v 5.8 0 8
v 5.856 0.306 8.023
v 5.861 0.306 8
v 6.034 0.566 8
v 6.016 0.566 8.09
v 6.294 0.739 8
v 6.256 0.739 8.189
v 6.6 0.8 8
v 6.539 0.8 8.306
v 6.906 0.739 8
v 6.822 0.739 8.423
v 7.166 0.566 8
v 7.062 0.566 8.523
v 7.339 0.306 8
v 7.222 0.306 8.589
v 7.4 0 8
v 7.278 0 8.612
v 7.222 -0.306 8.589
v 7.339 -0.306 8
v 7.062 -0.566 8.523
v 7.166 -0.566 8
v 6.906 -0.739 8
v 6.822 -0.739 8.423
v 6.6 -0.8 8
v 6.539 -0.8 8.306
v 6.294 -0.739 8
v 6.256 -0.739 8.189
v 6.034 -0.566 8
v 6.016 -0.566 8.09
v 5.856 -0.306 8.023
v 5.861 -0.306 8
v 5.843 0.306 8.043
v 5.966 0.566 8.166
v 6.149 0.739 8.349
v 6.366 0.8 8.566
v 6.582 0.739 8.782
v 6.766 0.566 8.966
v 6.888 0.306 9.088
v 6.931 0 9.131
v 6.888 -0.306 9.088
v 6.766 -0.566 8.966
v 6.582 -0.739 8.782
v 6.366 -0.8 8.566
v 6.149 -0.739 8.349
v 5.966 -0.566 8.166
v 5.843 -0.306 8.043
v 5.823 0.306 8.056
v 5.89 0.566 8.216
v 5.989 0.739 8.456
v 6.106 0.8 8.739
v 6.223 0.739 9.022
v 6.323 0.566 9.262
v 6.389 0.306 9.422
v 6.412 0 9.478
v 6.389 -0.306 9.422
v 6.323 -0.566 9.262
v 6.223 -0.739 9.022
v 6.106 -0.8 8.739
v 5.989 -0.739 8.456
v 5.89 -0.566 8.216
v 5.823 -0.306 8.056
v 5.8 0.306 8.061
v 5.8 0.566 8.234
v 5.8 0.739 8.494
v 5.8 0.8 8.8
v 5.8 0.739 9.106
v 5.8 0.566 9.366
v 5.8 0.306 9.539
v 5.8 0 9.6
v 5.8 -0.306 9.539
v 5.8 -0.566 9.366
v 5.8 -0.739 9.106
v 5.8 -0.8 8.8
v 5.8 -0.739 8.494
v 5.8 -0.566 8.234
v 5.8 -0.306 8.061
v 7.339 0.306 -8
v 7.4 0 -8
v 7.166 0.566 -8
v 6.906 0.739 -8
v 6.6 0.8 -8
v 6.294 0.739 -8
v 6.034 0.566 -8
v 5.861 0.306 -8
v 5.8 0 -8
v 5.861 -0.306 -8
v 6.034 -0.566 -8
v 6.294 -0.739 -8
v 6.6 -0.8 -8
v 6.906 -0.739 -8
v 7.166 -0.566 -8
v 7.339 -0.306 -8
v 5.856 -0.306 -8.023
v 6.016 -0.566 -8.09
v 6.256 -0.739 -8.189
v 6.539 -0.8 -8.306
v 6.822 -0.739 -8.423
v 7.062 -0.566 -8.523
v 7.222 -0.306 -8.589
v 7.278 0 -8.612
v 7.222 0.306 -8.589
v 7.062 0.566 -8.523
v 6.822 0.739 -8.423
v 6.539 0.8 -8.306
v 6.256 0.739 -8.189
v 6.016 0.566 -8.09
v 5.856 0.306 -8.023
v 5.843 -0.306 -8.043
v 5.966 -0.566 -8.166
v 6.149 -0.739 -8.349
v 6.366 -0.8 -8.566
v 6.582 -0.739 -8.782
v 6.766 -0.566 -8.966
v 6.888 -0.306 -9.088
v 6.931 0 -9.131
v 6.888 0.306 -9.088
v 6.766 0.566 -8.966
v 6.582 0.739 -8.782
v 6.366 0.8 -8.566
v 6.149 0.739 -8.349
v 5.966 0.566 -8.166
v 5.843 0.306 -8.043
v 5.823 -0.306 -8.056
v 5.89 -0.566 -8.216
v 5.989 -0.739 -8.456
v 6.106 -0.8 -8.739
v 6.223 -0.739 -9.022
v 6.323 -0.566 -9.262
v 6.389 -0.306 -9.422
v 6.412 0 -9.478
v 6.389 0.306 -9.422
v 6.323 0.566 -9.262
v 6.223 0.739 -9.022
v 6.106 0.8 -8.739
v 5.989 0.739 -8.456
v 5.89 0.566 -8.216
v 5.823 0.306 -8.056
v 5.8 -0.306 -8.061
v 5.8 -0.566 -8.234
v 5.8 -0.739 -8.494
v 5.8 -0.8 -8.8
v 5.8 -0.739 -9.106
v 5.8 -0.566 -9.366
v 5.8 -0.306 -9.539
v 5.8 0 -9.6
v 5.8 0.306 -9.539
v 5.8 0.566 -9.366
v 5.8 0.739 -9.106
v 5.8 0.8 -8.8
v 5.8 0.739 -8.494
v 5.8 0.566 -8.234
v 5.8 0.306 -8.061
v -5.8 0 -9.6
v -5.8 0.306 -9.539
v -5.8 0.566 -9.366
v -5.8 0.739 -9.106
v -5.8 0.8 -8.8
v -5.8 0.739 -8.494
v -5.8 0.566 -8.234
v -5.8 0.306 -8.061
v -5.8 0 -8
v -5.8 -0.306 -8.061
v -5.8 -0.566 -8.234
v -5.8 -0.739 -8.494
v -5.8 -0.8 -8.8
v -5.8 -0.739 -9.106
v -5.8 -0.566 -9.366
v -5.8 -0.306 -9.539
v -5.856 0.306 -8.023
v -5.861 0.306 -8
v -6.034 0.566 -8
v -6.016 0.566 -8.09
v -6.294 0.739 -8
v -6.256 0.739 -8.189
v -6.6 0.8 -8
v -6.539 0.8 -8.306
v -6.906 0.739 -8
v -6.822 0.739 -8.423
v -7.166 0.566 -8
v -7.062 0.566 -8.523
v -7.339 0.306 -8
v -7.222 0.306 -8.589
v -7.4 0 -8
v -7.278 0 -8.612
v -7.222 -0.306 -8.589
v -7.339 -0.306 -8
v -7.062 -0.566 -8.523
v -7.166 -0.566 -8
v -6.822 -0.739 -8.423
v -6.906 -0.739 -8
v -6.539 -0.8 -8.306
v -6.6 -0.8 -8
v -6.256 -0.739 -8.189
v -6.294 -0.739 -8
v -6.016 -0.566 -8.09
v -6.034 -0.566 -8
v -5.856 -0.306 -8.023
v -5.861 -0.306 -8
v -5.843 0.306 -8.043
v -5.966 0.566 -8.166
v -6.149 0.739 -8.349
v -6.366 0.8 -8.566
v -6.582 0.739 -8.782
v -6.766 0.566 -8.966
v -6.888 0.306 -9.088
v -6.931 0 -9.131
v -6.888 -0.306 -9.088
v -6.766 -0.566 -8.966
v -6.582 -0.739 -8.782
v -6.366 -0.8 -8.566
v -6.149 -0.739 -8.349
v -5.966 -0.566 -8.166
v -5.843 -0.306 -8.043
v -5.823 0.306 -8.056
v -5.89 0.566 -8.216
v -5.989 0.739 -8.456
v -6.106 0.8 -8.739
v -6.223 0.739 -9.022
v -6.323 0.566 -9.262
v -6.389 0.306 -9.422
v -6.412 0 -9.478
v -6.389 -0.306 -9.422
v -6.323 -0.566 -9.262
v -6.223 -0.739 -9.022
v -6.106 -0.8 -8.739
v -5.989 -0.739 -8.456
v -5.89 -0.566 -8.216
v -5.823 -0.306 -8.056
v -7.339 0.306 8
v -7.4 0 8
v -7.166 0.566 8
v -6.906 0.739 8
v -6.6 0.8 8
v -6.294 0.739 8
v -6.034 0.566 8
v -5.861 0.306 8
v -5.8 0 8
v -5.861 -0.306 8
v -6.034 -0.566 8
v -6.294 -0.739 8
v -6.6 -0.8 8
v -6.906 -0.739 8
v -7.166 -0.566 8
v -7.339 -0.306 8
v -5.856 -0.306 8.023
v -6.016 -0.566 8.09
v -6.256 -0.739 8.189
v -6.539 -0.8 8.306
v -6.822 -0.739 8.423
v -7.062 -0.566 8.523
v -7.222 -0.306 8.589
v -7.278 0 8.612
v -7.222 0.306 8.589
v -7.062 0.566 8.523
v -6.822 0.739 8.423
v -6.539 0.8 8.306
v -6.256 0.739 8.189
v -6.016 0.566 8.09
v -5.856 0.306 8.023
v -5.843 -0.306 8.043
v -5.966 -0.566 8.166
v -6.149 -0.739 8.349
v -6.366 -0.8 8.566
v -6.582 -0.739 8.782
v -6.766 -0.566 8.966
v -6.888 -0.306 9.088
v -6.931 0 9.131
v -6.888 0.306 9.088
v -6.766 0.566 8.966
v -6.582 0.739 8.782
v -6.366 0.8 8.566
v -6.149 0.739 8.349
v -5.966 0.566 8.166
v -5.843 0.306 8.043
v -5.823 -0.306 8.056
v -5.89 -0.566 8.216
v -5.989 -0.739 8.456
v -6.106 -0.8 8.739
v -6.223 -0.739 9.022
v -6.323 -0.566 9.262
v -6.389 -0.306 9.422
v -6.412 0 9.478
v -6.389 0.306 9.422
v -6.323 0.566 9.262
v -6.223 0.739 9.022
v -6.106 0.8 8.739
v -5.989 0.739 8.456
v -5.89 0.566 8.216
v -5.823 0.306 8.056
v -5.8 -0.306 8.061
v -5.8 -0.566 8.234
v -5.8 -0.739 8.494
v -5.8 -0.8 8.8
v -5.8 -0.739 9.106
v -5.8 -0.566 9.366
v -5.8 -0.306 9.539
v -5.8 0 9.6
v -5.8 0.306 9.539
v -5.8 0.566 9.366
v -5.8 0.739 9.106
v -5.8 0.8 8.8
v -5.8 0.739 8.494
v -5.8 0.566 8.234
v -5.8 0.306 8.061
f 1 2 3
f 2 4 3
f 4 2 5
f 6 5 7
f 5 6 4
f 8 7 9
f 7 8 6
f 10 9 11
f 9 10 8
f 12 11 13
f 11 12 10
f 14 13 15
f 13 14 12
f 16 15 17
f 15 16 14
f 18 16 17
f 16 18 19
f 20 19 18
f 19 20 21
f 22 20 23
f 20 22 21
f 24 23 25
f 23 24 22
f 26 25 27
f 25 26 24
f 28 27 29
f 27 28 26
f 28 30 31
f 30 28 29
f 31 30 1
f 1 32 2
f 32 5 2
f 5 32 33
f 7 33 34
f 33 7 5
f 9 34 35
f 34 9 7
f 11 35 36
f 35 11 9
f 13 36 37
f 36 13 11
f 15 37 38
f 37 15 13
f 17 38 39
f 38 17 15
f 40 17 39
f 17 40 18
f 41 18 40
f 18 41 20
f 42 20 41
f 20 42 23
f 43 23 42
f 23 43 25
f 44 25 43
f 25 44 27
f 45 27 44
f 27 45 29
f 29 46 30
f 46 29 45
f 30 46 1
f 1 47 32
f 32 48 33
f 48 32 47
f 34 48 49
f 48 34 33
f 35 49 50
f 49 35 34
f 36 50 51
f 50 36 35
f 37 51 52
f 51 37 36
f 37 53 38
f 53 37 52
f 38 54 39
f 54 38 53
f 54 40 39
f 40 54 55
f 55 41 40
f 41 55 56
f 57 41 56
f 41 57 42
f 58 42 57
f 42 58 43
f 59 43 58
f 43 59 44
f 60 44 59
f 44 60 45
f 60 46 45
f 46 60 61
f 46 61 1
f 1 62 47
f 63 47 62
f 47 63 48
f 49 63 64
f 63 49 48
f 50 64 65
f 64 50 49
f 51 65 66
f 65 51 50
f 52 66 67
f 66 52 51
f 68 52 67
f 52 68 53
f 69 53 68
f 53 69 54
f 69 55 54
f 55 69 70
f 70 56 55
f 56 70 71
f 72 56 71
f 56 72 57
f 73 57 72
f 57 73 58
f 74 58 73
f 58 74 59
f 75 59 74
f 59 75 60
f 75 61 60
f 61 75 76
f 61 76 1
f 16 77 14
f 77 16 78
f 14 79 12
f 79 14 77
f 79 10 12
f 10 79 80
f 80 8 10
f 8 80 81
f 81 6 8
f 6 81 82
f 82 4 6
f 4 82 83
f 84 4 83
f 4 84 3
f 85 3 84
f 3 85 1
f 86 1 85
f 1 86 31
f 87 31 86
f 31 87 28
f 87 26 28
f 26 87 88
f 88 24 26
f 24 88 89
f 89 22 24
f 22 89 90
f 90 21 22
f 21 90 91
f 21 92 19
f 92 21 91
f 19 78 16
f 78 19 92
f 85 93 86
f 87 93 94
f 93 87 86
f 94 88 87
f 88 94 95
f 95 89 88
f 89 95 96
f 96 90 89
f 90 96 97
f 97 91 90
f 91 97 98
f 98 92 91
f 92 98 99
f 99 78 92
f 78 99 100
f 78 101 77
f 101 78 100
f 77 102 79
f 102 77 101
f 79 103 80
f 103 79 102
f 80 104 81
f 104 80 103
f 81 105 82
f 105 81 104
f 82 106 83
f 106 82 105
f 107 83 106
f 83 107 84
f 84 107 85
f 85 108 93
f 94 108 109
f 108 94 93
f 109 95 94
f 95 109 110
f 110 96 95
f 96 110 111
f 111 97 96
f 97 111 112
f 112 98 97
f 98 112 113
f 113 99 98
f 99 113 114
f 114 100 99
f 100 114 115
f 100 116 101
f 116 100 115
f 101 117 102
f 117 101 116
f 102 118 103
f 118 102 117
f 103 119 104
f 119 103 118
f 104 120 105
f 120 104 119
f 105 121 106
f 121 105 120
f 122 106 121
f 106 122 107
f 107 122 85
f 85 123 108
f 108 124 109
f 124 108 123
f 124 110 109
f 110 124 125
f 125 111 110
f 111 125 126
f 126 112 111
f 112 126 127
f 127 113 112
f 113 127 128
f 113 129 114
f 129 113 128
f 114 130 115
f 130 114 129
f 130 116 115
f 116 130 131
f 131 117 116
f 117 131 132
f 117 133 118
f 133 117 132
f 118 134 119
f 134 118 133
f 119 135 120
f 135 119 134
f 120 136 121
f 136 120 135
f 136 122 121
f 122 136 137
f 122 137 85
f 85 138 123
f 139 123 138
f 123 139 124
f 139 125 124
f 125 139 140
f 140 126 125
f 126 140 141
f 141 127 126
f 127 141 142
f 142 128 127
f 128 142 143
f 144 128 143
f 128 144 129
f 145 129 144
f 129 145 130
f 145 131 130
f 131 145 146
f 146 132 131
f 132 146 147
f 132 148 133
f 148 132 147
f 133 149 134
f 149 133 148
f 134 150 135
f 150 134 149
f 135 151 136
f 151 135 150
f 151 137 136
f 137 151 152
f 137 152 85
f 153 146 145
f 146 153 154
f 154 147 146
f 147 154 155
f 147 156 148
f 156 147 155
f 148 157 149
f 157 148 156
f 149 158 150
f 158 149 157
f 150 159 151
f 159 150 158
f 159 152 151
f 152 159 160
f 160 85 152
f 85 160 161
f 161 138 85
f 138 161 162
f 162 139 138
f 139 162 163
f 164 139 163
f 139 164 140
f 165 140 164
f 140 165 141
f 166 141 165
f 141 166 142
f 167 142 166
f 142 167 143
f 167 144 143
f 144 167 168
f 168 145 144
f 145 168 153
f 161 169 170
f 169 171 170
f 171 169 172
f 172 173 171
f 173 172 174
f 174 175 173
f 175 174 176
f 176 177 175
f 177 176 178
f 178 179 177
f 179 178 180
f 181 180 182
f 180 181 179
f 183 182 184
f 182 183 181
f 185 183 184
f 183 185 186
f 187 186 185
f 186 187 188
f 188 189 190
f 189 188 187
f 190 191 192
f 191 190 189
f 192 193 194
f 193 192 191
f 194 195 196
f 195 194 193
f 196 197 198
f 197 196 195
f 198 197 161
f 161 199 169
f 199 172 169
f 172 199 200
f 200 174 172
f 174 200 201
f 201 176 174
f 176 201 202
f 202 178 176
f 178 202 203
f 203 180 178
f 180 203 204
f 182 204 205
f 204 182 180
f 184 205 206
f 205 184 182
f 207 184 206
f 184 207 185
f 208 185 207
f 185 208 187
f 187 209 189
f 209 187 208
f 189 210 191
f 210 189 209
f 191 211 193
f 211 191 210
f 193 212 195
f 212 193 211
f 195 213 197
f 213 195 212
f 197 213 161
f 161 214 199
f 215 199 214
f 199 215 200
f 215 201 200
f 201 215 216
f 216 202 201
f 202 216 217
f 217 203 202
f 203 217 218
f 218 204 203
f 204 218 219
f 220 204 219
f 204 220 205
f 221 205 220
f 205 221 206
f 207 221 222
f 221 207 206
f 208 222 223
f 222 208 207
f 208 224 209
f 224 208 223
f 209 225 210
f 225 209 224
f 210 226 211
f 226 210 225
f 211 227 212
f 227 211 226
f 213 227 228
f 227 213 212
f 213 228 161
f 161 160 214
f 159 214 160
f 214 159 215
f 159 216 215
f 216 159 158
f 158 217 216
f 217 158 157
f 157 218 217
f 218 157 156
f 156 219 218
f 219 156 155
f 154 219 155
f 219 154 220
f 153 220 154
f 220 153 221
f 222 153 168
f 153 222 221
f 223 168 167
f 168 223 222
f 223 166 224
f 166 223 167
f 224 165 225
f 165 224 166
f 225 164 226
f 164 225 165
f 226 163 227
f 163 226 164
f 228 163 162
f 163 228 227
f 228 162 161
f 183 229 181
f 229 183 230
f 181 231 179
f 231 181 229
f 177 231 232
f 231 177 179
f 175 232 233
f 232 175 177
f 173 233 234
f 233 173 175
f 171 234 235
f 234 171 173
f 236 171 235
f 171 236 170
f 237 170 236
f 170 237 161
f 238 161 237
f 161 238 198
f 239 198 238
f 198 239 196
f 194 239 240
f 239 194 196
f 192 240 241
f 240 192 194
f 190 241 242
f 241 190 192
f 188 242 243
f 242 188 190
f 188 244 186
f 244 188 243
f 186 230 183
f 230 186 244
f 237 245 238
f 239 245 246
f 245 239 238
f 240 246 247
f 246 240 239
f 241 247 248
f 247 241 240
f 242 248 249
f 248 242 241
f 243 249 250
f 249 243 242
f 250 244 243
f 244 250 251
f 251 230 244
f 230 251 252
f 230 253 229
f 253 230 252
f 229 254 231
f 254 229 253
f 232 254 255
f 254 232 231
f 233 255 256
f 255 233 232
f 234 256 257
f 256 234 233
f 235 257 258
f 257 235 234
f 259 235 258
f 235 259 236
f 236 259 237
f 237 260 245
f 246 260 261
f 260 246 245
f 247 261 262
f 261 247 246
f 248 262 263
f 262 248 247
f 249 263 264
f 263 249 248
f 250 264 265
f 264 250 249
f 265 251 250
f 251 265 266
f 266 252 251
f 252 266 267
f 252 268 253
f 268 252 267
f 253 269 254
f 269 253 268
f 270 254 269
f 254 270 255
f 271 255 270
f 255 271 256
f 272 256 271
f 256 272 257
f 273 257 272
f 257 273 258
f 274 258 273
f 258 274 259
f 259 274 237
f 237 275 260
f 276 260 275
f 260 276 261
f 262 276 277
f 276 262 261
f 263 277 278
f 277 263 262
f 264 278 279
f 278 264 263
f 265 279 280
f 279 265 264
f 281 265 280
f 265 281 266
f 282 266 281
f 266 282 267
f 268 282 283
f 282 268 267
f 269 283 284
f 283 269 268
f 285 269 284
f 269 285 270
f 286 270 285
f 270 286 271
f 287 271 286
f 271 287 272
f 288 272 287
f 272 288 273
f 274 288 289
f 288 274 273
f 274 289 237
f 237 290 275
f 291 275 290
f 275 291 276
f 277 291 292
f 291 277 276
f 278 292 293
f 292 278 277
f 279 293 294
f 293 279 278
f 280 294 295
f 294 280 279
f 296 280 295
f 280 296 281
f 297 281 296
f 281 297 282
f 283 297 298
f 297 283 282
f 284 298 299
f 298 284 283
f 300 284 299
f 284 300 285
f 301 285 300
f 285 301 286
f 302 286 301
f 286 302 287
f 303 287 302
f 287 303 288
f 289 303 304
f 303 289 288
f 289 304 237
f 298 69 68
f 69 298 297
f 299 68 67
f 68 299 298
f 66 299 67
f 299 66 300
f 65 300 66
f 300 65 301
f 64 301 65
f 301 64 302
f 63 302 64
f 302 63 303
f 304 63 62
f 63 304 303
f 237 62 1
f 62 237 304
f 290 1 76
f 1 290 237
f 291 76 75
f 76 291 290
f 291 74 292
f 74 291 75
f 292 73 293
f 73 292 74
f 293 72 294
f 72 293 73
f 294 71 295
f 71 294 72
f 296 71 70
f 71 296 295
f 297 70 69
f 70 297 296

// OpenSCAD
use <../lib.scad>
use <../p/4-4cyli.scad>
use <../p/r04q1000.scad>
$fa=1; $fs=0.2;
function ldraw_lib__85543_f3(realsolid=false) = [
// 0 Rubber Belt Round 15 /  1.6 (Formed for 2 Plates  2 x  2 with Hinge - Unloaded)
// 0 Name: 85543-f3.dat
// 0 Author: Magnus Forsberg [MagFors]
// 0 !LDRAW_ORG Part UPDATE 2019-03
// 0 !LICENSE Licensed under CC BY 2.0 and CC BY 4.0 : see CAreadme.txt
// 
// 0 !HELP 1 4 0 -6 40 1 0 0 0 -1 0 0 0 -1 15108.dat
// 0 !HELP 1 4 0 6 40 -1 0 0 0 1 0 0 0 -1 15108.dat
// 0 !HELP 1 71 10 0 0 1 0 0 0 1 0 0 0 1 4274.dat
// 0 !HELP 1 15 0 0 18 1 0 0 0 1 0 0 0 1 85543c03.dat
// 
// 0 BFC CERTIFY CCW
  [0,"BFC","CERTIFY"],
  [0,"BFC","CCW"],
// 
// 0 !CATEGORY Technic
// 
// 0 !HISTORY 2019-12-27 [PTadmin] Official Update 2019-03
// 
// 
// 1 16 14.5 -20 0 2 0 0 0 0 -2 0 2 0 r04q1000.dat
  [1,16,14.5,-20,0,2,0,0,0,0,-2,0,2,0, ldraw_lib__r04q1000(realsolid)],
// 1 16 16.5 -20 0 2 0 0 0 40 0 0 0 2 4-4cyli.dat
  [1,16,16.5,-20,0,2,0,0,0,40,0,0,0,2, ldraw_lib__4_4cyli(realsolid)],
// 1 16 14.5 20 0 2 0 0 0 0 2 0 -2 0 r04q1000.dat
  [1,16,14.5,20,0,2,0,0,0,0,2,0,-2,0, ldraw_lib__r04q1000(realsolid)],
// 1 16 14.5 22 0 0 -29 0 2 0 0 0 0 2 4-4cyli.dat
  [1,16,14.5,22,0,0,-29,0,2,0,0,0,0,2, ldraw_lib__4_4cyli(realsolid)],
// 1 16 -14.5 20 0 -2 0 0 0 0 2 0 2 0 r04q1000.dat
  [1,16,-14.5,20,0,-2,0,0,0,0,2,0,2,0, ldraw_lib__r04q1000(realsolid)],
// 1 16 -16.5 20 0 -2 0 0 0 -40 0 0 0 2 4-4cyli.dat
  [1,16,-16.5,20,0,-2,0,0,0,-40,0,0,0,2, ldraw_lib__4_4cyli(realsolid)],
// 1 16 -14.5 -20 0 -2 0 0 0 0 -2 0 -2 0 r04q1000.dat
  [1,16,-14.5,-20,0,-2,0,0,0,0,-2,0,-2,0, ldraw_lib__r04q1000(realsolid)],
// 1 16 -14.5 -22 0 0 29 0 -2 0 0 0 0 2 4-4cyli.dat
  [1,16,-14.5,-22,0,0,29,0,-2,0,0,0,0,2, ldraw_lib__4_4cyli(realsolid)],
];
module ldraw_lib__85543_f3(step=0, col=false, unit=2/5, alt=false, line=0.2, solid=!$preview)
    makepoly(ldraw_lib__85543_f3(solid), step=step, col=col, unit=unit, alt=alt, line=line, solid=solid);
ldraw_lib__85543_f3(line=0.2);
